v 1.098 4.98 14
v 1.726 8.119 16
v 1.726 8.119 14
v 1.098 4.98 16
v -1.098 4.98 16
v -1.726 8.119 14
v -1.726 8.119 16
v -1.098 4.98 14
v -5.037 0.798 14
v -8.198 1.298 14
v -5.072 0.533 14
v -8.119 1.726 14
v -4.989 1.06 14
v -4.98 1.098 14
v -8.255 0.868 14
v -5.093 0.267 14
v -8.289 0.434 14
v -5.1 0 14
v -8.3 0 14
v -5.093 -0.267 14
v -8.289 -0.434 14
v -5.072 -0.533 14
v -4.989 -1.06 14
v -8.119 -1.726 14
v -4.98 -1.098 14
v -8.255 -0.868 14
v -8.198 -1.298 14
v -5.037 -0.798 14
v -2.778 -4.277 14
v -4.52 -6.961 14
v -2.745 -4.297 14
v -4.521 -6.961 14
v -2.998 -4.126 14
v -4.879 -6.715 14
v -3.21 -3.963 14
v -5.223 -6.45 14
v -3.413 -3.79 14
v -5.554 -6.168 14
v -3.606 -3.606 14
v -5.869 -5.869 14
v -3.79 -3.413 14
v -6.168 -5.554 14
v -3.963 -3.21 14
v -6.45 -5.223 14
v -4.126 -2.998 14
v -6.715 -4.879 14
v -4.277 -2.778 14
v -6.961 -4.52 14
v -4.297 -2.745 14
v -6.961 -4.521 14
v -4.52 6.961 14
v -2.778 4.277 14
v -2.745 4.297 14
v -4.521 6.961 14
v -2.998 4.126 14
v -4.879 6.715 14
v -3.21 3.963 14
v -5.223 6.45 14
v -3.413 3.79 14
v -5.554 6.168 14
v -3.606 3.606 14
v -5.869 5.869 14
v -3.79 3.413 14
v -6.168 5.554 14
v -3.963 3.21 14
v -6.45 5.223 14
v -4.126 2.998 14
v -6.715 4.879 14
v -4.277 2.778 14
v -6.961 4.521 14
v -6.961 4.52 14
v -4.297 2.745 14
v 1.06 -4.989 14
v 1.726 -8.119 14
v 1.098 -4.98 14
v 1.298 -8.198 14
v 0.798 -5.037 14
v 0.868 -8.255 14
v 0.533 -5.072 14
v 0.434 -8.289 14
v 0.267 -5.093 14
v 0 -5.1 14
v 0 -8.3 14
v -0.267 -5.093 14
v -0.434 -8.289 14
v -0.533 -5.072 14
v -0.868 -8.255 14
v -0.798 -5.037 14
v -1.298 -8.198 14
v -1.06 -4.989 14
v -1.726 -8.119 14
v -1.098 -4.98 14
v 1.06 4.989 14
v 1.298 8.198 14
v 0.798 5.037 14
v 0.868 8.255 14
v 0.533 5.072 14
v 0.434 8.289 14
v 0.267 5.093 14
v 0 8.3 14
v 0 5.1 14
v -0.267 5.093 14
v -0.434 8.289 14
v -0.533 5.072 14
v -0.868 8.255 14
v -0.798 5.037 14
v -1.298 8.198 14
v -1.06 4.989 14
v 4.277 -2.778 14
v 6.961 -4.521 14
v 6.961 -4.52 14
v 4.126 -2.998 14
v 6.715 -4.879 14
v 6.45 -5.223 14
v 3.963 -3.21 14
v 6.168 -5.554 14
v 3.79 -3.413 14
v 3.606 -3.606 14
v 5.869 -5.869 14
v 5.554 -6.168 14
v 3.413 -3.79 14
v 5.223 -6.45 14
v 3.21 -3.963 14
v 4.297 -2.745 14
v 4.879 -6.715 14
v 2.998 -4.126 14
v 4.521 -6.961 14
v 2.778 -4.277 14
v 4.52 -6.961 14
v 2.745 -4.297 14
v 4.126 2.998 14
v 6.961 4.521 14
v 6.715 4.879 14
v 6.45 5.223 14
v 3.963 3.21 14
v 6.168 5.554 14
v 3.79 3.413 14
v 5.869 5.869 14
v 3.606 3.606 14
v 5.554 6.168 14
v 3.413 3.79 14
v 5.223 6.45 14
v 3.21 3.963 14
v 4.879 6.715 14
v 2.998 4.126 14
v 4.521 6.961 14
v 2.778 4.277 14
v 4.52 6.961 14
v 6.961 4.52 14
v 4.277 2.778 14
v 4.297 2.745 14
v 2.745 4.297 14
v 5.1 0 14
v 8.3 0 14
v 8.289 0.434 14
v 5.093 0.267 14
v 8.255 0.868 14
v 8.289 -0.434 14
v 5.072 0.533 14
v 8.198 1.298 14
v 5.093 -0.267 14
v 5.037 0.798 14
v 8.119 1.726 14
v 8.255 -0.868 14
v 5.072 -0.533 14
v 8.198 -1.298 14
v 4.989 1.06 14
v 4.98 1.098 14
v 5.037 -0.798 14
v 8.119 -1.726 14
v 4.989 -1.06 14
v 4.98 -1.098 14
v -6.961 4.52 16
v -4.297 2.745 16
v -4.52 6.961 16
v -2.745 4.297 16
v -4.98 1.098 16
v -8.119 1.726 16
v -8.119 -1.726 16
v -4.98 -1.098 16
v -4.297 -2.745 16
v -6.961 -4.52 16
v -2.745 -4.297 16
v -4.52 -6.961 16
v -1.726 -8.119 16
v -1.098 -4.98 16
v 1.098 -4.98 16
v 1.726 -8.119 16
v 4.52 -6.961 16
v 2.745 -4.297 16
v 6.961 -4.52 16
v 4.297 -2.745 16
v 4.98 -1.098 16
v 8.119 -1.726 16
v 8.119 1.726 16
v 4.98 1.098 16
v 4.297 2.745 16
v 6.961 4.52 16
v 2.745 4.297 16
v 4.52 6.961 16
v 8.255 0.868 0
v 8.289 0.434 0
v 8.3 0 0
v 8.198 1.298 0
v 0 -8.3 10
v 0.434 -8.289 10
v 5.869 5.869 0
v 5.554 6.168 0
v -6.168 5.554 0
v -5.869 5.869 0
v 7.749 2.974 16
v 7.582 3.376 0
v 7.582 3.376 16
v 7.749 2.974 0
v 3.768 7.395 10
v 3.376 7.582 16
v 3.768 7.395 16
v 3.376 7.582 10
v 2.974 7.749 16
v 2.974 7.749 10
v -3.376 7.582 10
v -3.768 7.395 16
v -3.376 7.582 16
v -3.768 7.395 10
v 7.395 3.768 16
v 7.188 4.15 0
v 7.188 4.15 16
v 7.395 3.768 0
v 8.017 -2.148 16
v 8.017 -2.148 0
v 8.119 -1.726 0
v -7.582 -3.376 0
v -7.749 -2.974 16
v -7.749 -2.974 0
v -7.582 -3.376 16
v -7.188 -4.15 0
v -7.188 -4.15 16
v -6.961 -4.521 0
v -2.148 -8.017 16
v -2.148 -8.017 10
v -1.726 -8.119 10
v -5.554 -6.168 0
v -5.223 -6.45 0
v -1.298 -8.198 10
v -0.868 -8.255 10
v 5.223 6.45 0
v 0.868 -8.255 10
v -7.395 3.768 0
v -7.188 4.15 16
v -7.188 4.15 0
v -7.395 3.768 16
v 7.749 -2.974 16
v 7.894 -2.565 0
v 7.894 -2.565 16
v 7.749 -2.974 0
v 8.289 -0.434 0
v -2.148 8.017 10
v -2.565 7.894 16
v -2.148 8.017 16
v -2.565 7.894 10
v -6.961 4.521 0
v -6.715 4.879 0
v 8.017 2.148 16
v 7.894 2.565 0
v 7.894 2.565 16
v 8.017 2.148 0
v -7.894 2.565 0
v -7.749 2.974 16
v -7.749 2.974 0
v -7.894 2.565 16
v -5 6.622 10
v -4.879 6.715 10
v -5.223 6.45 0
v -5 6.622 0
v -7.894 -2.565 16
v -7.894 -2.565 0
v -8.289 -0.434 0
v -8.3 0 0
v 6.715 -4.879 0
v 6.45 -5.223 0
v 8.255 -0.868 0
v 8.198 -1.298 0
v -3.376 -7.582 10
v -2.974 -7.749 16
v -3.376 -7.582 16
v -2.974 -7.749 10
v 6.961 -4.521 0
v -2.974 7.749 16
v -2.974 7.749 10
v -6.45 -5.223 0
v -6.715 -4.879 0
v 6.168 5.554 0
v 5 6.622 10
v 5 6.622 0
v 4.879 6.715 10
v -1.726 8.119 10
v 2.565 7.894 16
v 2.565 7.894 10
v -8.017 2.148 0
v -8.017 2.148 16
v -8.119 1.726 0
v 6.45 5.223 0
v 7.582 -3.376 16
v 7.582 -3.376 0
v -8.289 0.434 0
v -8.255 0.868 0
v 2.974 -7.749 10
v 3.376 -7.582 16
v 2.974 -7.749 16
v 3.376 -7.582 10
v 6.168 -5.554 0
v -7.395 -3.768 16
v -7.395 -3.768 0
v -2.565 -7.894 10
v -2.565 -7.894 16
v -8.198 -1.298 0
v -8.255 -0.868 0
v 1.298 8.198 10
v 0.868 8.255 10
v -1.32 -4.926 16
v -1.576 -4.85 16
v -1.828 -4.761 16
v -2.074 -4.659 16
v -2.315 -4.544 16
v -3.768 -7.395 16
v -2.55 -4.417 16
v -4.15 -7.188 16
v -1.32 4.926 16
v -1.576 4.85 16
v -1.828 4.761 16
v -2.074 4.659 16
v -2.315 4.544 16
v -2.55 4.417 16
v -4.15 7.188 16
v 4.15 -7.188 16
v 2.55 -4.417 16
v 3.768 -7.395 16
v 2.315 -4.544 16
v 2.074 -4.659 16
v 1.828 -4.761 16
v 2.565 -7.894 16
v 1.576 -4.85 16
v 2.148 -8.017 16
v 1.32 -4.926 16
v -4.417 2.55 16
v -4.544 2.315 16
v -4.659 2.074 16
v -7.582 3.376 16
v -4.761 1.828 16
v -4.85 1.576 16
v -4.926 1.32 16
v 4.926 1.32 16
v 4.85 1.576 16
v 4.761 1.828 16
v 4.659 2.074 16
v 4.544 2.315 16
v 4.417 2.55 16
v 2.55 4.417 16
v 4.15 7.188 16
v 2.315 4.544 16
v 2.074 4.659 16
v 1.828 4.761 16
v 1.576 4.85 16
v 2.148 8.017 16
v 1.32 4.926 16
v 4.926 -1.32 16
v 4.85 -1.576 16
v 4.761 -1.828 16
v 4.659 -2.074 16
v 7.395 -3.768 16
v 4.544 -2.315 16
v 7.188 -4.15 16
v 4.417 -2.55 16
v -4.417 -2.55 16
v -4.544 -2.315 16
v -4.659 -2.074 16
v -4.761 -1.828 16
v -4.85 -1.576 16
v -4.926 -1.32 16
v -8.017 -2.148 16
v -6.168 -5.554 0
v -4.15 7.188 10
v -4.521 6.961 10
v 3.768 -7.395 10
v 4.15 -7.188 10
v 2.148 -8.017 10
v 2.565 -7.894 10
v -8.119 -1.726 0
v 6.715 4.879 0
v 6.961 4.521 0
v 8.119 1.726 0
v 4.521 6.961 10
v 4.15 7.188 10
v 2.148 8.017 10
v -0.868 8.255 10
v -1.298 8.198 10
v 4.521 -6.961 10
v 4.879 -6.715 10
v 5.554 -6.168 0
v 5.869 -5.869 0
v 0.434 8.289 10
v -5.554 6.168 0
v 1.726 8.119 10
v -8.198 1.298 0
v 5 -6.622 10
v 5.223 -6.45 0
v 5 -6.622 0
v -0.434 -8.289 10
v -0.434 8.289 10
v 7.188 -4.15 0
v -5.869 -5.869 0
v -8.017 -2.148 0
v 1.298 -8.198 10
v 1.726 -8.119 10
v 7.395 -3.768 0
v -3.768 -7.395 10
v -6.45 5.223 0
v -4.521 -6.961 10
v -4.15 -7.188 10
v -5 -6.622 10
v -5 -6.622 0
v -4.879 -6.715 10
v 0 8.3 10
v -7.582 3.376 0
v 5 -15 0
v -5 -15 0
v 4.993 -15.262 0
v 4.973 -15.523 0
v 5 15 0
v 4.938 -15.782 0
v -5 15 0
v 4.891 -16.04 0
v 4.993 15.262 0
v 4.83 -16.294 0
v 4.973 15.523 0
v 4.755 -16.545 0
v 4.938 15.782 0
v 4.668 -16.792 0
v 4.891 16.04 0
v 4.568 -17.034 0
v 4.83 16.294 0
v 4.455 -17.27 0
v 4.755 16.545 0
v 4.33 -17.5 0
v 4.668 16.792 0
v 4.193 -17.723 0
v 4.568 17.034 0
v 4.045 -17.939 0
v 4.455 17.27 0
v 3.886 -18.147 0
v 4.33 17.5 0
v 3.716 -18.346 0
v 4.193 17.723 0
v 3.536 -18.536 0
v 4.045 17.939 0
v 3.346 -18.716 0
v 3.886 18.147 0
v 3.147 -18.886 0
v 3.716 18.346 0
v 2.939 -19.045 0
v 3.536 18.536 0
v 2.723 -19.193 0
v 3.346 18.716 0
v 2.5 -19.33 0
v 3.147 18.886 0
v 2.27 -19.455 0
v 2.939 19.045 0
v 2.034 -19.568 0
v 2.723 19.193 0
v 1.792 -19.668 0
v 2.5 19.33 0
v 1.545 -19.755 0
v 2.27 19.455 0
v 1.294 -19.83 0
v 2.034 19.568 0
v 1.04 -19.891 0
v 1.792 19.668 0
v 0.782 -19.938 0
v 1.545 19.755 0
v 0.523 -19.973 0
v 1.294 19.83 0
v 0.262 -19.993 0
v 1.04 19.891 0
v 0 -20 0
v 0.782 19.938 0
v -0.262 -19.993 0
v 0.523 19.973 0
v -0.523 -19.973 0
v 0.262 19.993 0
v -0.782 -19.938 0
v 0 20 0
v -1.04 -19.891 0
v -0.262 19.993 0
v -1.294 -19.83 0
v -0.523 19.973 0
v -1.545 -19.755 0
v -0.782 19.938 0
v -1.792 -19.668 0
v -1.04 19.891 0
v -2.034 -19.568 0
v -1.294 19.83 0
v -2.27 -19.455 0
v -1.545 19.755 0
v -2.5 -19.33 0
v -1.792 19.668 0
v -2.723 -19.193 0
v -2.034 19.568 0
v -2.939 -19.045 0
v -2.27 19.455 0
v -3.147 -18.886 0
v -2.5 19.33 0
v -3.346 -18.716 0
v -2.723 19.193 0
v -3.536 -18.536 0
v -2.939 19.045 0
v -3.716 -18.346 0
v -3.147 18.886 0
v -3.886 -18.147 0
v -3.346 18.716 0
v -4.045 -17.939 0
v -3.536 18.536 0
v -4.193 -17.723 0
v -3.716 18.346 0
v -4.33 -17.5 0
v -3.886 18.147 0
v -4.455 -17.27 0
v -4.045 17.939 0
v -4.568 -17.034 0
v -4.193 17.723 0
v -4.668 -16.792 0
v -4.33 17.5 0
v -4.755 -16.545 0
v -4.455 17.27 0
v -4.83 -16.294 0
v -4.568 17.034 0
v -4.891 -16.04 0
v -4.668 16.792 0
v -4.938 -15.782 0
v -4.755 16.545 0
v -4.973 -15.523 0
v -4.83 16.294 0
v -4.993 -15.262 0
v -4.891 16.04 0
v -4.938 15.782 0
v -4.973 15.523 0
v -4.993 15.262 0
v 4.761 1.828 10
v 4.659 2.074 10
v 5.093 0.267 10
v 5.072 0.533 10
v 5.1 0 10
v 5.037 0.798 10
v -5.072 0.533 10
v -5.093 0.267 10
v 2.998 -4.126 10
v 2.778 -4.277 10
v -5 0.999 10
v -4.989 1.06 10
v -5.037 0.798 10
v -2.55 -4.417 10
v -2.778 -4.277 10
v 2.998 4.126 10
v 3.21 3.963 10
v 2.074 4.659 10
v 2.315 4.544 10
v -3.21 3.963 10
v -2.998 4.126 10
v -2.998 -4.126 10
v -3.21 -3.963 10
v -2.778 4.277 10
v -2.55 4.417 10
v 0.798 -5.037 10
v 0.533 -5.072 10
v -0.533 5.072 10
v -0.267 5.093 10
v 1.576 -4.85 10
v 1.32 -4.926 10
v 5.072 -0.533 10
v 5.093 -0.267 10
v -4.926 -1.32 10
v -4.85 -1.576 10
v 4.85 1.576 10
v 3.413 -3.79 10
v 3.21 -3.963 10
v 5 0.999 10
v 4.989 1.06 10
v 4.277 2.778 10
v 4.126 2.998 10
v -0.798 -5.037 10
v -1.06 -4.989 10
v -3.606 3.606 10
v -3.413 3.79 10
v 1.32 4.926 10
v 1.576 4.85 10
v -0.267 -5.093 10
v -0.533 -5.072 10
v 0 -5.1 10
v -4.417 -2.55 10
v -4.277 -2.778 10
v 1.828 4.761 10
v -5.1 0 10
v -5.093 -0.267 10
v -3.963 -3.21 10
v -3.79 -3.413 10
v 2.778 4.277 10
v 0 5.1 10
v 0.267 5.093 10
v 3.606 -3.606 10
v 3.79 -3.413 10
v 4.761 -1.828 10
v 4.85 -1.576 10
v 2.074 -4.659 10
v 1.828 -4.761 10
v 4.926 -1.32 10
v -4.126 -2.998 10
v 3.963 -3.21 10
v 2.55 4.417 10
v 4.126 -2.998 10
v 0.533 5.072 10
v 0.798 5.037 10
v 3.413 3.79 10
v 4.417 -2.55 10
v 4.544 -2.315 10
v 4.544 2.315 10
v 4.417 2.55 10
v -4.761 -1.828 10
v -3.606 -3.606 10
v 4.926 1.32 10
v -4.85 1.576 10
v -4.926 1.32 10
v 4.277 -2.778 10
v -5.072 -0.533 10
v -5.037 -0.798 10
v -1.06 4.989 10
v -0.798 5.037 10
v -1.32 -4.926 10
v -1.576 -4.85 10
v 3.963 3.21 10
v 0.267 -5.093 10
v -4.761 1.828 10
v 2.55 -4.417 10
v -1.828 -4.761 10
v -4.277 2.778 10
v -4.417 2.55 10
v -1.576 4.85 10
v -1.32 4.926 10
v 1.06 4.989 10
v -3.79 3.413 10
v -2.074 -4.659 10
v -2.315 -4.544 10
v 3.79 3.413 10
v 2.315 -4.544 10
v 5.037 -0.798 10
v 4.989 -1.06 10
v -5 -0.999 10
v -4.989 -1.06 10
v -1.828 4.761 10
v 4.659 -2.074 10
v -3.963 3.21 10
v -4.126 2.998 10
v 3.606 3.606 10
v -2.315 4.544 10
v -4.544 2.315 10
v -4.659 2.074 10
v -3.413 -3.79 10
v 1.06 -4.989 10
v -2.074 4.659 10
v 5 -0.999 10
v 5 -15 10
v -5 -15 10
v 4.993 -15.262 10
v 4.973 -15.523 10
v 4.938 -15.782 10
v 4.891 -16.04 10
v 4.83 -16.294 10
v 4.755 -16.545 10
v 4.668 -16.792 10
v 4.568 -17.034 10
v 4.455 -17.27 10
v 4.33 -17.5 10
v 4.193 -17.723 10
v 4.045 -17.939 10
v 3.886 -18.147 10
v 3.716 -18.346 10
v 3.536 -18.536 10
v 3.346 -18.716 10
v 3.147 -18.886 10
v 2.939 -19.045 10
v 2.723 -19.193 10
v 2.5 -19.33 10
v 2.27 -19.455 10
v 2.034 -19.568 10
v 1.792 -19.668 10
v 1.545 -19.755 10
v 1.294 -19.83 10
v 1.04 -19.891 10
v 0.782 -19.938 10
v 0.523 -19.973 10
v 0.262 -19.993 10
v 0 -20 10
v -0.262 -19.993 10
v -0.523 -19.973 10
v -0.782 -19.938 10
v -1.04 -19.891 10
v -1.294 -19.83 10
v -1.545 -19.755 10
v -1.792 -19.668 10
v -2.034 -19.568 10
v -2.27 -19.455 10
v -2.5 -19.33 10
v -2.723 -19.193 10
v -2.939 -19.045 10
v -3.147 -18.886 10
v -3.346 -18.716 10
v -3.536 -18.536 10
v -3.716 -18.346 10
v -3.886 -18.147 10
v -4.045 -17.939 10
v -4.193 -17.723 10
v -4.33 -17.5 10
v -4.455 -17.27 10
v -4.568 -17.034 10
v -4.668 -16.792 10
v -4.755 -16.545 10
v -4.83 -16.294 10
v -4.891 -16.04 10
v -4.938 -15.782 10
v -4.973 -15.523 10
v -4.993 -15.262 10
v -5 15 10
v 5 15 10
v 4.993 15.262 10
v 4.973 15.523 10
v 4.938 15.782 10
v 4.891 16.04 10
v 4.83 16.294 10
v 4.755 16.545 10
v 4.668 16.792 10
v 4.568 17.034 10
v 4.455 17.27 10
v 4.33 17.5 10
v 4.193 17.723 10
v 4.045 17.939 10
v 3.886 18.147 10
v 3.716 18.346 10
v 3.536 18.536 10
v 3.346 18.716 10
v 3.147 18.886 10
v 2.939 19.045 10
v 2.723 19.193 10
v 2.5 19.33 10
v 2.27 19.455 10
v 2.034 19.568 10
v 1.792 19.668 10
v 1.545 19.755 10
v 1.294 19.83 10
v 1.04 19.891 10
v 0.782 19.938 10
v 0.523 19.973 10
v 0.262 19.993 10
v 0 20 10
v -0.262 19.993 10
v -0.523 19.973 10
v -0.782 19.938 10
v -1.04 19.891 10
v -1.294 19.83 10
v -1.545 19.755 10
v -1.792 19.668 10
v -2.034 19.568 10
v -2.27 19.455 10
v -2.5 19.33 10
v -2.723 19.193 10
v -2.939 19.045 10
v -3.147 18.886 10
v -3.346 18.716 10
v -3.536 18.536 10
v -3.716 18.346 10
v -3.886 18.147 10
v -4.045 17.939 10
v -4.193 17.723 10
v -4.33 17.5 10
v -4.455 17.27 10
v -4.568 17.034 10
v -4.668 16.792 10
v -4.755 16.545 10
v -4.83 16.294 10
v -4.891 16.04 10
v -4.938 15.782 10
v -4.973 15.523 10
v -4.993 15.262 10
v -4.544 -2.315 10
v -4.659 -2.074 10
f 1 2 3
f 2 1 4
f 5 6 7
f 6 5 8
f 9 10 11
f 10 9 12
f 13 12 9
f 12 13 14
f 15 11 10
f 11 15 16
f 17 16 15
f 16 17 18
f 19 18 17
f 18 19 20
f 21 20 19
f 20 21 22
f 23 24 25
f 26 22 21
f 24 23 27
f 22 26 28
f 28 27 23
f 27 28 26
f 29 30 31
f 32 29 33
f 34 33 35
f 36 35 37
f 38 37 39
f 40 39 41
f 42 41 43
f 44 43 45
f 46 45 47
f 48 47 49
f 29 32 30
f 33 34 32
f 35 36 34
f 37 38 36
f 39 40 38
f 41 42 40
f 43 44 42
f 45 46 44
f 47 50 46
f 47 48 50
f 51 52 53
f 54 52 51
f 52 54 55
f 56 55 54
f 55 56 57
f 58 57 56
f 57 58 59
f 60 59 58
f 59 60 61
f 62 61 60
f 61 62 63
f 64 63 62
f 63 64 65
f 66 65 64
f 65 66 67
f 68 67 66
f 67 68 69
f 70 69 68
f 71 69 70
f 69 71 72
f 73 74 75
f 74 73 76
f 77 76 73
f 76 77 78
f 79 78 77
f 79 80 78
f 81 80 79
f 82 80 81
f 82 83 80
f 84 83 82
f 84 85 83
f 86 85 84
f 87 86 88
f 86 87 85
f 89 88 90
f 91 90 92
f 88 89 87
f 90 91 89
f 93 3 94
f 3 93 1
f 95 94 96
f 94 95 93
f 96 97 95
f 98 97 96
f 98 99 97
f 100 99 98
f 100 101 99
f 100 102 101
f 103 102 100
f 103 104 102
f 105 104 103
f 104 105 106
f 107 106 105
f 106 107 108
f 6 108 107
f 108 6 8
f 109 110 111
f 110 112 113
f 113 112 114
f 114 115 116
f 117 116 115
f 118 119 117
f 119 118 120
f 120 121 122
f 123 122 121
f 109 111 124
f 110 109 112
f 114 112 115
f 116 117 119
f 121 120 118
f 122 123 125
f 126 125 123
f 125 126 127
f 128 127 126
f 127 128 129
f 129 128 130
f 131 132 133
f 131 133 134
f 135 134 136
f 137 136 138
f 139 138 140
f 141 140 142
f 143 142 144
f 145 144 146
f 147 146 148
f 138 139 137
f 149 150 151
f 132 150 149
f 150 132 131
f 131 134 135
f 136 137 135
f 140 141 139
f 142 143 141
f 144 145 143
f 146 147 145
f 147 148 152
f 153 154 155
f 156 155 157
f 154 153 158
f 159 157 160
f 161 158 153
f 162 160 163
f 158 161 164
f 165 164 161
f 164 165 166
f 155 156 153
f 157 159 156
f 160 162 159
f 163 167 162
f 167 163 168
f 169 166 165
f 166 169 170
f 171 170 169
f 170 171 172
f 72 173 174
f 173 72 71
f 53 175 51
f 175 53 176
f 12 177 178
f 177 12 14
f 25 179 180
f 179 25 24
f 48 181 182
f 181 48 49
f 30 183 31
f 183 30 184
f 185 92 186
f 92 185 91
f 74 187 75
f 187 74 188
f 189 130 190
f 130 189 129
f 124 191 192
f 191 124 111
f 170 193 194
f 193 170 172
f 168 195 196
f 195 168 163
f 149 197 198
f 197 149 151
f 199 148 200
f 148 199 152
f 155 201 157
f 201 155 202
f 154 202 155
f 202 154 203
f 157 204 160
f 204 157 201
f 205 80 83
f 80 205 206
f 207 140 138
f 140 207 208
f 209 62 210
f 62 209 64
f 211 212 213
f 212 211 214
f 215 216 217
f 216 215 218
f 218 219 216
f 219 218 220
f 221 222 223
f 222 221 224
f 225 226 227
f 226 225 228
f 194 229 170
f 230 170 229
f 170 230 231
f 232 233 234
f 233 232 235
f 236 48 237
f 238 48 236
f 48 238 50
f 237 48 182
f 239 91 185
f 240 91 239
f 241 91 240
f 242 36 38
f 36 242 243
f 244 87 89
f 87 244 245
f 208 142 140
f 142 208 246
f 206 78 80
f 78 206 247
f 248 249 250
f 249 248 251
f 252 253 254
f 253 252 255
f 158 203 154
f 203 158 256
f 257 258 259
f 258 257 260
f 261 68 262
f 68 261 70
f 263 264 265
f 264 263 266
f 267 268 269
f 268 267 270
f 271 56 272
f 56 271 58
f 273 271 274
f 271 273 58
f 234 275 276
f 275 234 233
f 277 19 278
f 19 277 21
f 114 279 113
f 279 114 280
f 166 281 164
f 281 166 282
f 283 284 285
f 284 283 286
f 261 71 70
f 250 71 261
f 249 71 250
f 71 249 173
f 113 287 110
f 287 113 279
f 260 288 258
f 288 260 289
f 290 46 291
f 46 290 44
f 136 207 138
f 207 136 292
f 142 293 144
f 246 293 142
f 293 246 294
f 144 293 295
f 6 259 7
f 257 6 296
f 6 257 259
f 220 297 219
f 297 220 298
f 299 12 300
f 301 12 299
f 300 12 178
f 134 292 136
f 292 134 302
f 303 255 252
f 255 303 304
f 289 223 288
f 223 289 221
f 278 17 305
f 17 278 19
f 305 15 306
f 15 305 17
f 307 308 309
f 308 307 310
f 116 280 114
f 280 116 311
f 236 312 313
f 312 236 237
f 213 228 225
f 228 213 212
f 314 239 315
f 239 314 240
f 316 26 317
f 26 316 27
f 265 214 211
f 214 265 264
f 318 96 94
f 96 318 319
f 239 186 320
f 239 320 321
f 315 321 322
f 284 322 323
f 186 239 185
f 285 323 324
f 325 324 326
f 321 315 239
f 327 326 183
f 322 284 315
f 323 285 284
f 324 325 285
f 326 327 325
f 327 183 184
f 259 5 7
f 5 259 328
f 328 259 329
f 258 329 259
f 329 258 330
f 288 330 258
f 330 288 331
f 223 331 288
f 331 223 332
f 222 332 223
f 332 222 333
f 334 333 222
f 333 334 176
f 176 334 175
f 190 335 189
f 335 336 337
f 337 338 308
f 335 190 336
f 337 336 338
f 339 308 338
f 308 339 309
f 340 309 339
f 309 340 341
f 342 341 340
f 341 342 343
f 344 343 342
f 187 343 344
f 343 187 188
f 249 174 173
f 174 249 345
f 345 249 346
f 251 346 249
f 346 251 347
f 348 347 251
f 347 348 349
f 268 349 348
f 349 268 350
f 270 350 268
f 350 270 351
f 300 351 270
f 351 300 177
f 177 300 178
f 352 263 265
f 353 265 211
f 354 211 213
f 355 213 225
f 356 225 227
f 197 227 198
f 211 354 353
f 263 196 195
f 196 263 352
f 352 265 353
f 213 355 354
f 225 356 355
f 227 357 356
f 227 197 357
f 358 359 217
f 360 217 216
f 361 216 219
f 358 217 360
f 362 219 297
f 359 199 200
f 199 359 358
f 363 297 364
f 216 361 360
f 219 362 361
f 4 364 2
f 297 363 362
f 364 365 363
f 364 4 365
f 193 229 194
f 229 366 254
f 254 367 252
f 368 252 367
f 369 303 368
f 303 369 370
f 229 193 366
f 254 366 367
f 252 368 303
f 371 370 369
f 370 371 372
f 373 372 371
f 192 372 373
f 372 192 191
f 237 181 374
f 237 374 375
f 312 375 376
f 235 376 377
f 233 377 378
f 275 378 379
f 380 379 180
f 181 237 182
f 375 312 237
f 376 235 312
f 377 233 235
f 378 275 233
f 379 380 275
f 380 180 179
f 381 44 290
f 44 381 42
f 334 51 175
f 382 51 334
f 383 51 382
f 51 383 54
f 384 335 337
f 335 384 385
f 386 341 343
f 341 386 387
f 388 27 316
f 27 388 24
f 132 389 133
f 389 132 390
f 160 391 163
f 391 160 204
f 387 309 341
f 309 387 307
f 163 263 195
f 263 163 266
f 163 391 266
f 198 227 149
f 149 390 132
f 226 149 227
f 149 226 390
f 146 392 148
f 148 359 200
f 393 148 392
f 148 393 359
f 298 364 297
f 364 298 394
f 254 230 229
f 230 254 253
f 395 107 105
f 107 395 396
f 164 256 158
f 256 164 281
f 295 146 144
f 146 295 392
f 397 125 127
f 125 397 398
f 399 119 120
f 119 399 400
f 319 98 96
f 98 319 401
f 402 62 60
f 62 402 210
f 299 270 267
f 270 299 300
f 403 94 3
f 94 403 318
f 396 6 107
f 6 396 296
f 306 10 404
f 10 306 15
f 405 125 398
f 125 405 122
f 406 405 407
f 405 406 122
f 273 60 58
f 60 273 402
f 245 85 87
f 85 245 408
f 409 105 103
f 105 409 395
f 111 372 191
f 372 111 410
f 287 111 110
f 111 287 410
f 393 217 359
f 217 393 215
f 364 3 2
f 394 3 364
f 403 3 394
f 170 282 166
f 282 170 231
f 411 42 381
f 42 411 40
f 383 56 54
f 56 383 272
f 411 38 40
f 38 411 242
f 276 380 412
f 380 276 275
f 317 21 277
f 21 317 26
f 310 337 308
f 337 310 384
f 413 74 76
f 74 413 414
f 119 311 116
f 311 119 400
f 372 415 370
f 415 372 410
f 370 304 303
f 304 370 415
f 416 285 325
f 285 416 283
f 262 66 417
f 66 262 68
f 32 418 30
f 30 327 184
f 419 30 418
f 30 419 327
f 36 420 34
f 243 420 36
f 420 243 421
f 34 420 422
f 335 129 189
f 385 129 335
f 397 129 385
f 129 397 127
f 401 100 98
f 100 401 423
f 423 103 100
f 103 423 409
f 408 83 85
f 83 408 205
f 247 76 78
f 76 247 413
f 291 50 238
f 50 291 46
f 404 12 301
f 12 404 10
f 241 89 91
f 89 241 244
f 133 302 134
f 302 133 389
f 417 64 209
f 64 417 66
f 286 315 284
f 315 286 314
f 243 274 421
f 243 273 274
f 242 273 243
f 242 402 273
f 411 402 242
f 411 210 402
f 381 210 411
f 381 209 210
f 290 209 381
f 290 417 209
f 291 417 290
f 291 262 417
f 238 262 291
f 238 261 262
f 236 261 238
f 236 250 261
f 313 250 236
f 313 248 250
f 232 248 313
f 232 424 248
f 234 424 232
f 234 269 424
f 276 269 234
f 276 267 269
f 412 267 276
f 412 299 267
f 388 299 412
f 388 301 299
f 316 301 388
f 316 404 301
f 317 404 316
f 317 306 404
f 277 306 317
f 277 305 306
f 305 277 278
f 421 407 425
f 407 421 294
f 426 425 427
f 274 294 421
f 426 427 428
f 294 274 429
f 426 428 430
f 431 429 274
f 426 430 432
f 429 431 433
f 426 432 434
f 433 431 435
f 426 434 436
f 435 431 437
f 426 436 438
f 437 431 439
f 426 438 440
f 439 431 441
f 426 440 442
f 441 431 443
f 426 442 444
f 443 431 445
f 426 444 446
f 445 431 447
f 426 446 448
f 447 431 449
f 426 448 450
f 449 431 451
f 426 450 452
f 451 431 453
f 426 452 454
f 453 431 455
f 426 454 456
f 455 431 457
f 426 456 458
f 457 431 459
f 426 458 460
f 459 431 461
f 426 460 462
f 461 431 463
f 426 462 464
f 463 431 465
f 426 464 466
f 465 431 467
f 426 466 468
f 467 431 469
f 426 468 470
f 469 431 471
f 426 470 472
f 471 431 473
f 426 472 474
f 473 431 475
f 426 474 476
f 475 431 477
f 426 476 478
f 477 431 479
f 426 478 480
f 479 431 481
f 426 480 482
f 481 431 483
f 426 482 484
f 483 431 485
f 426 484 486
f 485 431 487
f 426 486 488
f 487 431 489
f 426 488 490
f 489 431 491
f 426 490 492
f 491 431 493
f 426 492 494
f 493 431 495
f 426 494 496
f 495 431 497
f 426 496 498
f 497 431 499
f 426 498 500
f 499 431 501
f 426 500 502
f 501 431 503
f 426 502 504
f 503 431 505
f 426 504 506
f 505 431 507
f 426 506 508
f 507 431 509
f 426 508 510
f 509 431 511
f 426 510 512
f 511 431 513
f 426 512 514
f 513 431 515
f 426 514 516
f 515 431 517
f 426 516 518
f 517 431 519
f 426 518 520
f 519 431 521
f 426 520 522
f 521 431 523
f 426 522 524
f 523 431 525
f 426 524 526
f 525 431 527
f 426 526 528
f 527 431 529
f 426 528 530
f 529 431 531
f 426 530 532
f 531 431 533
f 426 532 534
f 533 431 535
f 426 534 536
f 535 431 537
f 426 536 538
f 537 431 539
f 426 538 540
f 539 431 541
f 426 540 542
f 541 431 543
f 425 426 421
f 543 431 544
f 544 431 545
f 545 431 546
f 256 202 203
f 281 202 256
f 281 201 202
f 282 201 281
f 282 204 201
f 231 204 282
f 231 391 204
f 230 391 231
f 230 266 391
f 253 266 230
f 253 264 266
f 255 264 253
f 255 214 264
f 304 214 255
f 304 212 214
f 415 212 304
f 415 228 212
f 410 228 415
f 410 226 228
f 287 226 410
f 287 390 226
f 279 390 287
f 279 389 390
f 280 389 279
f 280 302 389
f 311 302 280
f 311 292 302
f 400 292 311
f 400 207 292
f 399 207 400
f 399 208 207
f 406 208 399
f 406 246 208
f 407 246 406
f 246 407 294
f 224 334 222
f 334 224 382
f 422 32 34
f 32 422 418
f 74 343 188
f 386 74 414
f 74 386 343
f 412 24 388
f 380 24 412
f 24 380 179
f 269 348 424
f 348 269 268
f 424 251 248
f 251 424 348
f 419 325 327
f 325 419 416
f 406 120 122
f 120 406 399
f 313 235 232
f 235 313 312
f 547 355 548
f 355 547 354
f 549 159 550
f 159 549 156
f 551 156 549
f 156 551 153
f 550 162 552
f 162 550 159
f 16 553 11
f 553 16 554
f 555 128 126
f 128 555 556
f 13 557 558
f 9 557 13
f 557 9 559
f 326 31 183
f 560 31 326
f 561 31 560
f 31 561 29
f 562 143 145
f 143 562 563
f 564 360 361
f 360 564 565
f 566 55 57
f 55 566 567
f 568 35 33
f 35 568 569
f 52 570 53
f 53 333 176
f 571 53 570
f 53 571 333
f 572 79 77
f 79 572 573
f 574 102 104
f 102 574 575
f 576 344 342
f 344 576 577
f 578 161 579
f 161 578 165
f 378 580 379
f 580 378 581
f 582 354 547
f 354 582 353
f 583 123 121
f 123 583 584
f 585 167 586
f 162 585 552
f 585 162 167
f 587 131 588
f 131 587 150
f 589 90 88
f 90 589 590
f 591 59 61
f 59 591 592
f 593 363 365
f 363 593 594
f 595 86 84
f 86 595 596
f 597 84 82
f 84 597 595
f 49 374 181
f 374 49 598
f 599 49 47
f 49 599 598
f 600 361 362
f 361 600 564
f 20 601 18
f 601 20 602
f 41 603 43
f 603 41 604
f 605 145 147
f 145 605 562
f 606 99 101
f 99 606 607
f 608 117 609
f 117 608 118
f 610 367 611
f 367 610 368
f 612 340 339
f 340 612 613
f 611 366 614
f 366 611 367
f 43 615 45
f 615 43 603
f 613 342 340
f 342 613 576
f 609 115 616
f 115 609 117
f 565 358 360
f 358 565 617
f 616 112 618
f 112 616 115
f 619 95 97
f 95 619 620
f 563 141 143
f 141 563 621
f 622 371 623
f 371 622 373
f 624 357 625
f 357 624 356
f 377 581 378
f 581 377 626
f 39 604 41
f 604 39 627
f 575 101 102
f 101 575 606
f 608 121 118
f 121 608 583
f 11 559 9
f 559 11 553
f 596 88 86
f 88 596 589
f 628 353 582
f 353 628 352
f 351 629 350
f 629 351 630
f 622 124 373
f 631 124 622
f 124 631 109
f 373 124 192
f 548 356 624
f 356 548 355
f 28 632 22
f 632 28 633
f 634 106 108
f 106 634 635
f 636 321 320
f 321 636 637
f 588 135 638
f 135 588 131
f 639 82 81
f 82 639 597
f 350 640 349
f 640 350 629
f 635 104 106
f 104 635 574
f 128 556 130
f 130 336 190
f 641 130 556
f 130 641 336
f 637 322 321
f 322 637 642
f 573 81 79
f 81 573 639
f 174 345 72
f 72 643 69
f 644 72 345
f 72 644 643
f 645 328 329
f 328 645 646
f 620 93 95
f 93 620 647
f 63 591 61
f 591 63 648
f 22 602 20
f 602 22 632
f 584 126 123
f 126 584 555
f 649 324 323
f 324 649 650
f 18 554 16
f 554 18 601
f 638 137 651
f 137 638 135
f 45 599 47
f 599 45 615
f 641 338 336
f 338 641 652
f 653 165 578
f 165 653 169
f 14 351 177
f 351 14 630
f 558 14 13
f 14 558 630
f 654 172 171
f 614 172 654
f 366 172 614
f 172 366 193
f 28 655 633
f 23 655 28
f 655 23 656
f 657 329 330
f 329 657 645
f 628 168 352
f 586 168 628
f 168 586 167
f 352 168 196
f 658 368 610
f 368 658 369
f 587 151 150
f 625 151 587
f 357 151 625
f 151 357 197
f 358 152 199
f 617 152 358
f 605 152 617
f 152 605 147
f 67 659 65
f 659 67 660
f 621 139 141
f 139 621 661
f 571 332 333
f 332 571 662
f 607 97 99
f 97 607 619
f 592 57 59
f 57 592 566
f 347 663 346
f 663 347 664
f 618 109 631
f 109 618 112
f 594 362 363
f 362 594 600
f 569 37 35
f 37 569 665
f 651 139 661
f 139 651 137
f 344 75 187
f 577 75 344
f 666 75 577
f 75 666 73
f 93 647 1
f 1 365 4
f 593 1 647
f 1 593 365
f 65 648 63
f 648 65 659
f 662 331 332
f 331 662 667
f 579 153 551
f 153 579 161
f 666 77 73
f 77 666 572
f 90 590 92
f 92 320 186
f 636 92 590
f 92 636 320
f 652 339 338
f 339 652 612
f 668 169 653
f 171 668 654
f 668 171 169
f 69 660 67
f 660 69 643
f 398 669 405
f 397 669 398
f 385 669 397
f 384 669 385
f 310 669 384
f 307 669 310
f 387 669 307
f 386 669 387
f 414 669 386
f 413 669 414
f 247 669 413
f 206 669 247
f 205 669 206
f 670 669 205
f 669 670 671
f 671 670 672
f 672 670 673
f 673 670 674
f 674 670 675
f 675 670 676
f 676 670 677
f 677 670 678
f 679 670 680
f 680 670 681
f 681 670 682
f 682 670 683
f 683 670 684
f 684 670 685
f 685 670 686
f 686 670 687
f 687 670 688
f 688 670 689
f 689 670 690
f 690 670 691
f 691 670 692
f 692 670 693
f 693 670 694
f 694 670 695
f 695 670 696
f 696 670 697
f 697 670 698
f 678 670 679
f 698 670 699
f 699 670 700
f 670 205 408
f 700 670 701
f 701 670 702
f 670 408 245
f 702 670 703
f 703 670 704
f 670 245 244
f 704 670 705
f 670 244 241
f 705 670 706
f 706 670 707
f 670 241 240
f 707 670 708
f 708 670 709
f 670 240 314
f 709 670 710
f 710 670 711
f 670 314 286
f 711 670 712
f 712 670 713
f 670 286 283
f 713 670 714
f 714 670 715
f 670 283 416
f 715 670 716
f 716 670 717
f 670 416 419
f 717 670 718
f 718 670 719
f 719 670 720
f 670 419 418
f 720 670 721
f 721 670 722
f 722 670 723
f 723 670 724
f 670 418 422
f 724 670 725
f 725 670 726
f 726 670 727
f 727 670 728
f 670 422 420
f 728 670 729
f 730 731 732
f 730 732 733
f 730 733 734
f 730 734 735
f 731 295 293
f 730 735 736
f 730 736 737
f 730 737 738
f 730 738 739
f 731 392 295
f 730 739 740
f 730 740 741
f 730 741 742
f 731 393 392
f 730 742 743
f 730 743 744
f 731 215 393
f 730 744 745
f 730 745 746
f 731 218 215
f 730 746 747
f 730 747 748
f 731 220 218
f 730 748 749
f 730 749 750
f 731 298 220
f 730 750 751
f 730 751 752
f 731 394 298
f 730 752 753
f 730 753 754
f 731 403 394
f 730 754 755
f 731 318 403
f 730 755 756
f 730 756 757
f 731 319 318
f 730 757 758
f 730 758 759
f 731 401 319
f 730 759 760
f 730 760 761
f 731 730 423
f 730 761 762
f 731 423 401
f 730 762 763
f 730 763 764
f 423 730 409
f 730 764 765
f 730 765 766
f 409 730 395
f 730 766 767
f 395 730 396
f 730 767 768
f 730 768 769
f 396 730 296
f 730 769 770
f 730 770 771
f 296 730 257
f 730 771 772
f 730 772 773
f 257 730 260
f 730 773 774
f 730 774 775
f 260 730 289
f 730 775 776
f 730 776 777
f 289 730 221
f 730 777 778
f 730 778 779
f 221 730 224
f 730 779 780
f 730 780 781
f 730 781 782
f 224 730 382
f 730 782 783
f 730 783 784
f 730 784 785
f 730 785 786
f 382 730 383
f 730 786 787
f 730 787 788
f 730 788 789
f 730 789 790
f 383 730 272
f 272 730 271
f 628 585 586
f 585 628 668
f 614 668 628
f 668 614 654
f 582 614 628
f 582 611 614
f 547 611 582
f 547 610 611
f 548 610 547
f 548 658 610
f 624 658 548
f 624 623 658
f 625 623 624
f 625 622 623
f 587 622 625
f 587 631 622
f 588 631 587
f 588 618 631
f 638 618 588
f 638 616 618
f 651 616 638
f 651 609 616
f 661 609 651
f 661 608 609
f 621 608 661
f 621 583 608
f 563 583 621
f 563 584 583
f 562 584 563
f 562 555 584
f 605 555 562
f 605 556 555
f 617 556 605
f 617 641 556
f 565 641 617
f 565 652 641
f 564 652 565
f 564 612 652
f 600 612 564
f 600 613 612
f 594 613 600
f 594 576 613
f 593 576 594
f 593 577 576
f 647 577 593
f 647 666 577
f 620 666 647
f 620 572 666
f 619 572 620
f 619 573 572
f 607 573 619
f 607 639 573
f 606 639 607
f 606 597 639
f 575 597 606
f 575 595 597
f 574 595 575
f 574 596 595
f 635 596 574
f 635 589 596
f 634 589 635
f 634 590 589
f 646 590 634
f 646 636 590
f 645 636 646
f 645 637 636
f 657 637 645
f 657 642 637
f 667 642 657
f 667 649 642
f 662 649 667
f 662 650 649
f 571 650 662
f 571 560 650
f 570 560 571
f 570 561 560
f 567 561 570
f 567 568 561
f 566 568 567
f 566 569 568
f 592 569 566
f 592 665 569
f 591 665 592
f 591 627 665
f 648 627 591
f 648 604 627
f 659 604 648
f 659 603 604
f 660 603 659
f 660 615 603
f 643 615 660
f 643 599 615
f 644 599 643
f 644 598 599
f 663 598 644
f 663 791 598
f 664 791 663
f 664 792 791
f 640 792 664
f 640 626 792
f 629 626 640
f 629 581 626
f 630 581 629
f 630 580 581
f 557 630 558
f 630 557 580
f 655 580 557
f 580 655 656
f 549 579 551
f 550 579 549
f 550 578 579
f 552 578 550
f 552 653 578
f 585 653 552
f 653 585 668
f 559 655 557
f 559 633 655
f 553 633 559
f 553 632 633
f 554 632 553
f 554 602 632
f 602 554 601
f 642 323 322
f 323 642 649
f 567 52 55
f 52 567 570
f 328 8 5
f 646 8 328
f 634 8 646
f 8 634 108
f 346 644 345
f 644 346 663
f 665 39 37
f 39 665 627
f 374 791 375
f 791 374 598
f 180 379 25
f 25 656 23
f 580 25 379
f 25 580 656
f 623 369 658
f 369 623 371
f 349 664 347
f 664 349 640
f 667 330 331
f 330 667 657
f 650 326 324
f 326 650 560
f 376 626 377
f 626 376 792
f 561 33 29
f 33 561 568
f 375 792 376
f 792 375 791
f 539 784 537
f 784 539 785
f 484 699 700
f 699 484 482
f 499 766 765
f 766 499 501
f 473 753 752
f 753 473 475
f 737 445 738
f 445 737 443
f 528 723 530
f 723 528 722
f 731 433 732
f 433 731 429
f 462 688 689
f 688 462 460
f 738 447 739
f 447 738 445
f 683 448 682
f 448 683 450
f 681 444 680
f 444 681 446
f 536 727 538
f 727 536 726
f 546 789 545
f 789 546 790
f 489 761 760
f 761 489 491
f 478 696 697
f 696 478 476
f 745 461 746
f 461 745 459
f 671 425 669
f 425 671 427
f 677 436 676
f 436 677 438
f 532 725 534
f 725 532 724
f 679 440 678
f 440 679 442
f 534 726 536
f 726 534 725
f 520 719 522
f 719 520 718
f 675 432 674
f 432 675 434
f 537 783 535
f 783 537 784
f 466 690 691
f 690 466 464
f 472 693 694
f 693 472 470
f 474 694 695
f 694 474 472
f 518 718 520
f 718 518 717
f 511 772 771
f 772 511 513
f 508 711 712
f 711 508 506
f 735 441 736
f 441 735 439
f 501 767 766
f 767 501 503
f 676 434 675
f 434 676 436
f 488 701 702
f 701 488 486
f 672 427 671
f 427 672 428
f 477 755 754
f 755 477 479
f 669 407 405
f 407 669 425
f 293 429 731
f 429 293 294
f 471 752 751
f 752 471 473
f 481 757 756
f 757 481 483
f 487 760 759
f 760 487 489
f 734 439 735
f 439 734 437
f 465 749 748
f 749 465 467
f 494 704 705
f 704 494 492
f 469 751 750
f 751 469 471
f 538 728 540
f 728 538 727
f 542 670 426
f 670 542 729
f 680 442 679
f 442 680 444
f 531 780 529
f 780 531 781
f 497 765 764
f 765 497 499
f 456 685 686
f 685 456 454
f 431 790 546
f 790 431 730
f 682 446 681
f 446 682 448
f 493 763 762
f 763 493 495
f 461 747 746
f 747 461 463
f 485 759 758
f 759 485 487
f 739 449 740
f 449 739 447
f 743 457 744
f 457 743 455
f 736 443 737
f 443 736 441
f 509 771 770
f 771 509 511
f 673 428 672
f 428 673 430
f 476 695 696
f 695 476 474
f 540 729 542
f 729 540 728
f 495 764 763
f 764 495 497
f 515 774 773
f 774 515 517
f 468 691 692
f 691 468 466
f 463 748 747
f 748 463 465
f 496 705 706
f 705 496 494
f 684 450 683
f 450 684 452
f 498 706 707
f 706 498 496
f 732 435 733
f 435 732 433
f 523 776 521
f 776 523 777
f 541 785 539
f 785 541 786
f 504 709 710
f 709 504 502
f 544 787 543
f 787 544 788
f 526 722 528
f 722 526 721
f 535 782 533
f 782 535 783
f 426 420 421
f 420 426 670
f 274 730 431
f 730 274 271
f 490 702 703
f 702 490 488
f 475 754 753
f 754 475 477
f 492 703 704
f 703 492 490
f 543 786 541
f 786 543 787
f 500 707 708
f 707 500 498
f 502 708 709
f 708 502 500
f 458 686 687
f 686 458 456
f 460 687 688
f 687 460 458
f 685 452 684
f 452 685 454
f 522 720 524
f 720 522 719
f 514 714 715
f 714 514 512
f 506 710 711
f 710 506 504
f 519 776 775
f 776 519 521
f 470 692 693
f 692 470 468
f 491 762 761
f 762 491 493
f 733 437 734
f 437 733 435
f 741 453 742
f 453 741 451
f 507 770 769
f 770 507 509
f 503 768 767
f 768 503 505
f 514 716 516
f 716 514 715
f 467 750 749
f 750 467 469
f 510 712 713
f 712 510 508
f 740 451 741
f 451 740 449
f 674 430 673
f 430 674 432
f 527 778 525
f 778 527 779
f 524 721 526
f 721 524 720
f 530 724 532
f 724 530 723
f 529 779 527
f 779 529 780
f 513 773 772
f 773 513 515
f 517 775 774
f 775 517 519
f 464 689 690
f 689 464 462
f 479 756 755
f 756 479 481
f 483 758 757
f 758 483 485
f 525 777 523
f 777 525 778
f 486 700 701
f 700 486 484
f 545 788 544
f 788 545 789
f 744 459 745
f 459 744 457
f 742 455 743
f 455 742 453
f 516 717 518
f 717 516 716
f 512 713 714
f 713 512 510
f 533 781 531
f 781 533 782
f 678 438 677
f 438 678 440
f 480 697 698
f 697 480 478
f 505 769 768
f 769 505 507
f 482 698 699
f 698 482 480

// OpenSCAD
$fn = $preview ? 20 : 120;

hndl_h = 10;
hndl_w = 10;
hndl_l = 30;

key_d = 16.6;
key_h = 16;
wall = 3.2;
crh_h = 6;
tht_w = 2.7;
spk_h = crh_h+1;

module wedge () {
    _l = 20;
    hull() {
        cylinder(3, .1, .1);
        translate([-4,_l,0]) cylinder(3, .1, .1);
        translate([4,_l,0]) cylinder(3, .1, .1);
    }
}
module spoke () {
    //cube([key_d+1,tht_w,spk_h], true);
    wedge();
}
module spokes () {
    spoke();
    rotate([0,0,45]) spoke();
    rotate([0,0,90]) spoke();
    rotate([0,0,135]) spoke();
    rotate([0,0,180]) spoke();
    rotate([0,0,225]) spoke();
    rotate([0,0,270]) spoke();
    rotate([0,0,315]) spoke();
}
hull() {
    translate([0,hndl_l/2,0]) cylinder(hndl_h, d = hndl_w);
    translate([0,-hndl_l/2,0]) cylinder(hndl_h, d = hndl_w);
}

difference() {
    cylinder(key_h, d = key_d);
    translate([0,0,hndl_h]) cylinder(key_h, d = key_d-wall*2);
    translate([0,0,key_h-2/*+spk_h/4*/]) spokes();
}

//translate([0,0,spk_h/2]) spokes();
